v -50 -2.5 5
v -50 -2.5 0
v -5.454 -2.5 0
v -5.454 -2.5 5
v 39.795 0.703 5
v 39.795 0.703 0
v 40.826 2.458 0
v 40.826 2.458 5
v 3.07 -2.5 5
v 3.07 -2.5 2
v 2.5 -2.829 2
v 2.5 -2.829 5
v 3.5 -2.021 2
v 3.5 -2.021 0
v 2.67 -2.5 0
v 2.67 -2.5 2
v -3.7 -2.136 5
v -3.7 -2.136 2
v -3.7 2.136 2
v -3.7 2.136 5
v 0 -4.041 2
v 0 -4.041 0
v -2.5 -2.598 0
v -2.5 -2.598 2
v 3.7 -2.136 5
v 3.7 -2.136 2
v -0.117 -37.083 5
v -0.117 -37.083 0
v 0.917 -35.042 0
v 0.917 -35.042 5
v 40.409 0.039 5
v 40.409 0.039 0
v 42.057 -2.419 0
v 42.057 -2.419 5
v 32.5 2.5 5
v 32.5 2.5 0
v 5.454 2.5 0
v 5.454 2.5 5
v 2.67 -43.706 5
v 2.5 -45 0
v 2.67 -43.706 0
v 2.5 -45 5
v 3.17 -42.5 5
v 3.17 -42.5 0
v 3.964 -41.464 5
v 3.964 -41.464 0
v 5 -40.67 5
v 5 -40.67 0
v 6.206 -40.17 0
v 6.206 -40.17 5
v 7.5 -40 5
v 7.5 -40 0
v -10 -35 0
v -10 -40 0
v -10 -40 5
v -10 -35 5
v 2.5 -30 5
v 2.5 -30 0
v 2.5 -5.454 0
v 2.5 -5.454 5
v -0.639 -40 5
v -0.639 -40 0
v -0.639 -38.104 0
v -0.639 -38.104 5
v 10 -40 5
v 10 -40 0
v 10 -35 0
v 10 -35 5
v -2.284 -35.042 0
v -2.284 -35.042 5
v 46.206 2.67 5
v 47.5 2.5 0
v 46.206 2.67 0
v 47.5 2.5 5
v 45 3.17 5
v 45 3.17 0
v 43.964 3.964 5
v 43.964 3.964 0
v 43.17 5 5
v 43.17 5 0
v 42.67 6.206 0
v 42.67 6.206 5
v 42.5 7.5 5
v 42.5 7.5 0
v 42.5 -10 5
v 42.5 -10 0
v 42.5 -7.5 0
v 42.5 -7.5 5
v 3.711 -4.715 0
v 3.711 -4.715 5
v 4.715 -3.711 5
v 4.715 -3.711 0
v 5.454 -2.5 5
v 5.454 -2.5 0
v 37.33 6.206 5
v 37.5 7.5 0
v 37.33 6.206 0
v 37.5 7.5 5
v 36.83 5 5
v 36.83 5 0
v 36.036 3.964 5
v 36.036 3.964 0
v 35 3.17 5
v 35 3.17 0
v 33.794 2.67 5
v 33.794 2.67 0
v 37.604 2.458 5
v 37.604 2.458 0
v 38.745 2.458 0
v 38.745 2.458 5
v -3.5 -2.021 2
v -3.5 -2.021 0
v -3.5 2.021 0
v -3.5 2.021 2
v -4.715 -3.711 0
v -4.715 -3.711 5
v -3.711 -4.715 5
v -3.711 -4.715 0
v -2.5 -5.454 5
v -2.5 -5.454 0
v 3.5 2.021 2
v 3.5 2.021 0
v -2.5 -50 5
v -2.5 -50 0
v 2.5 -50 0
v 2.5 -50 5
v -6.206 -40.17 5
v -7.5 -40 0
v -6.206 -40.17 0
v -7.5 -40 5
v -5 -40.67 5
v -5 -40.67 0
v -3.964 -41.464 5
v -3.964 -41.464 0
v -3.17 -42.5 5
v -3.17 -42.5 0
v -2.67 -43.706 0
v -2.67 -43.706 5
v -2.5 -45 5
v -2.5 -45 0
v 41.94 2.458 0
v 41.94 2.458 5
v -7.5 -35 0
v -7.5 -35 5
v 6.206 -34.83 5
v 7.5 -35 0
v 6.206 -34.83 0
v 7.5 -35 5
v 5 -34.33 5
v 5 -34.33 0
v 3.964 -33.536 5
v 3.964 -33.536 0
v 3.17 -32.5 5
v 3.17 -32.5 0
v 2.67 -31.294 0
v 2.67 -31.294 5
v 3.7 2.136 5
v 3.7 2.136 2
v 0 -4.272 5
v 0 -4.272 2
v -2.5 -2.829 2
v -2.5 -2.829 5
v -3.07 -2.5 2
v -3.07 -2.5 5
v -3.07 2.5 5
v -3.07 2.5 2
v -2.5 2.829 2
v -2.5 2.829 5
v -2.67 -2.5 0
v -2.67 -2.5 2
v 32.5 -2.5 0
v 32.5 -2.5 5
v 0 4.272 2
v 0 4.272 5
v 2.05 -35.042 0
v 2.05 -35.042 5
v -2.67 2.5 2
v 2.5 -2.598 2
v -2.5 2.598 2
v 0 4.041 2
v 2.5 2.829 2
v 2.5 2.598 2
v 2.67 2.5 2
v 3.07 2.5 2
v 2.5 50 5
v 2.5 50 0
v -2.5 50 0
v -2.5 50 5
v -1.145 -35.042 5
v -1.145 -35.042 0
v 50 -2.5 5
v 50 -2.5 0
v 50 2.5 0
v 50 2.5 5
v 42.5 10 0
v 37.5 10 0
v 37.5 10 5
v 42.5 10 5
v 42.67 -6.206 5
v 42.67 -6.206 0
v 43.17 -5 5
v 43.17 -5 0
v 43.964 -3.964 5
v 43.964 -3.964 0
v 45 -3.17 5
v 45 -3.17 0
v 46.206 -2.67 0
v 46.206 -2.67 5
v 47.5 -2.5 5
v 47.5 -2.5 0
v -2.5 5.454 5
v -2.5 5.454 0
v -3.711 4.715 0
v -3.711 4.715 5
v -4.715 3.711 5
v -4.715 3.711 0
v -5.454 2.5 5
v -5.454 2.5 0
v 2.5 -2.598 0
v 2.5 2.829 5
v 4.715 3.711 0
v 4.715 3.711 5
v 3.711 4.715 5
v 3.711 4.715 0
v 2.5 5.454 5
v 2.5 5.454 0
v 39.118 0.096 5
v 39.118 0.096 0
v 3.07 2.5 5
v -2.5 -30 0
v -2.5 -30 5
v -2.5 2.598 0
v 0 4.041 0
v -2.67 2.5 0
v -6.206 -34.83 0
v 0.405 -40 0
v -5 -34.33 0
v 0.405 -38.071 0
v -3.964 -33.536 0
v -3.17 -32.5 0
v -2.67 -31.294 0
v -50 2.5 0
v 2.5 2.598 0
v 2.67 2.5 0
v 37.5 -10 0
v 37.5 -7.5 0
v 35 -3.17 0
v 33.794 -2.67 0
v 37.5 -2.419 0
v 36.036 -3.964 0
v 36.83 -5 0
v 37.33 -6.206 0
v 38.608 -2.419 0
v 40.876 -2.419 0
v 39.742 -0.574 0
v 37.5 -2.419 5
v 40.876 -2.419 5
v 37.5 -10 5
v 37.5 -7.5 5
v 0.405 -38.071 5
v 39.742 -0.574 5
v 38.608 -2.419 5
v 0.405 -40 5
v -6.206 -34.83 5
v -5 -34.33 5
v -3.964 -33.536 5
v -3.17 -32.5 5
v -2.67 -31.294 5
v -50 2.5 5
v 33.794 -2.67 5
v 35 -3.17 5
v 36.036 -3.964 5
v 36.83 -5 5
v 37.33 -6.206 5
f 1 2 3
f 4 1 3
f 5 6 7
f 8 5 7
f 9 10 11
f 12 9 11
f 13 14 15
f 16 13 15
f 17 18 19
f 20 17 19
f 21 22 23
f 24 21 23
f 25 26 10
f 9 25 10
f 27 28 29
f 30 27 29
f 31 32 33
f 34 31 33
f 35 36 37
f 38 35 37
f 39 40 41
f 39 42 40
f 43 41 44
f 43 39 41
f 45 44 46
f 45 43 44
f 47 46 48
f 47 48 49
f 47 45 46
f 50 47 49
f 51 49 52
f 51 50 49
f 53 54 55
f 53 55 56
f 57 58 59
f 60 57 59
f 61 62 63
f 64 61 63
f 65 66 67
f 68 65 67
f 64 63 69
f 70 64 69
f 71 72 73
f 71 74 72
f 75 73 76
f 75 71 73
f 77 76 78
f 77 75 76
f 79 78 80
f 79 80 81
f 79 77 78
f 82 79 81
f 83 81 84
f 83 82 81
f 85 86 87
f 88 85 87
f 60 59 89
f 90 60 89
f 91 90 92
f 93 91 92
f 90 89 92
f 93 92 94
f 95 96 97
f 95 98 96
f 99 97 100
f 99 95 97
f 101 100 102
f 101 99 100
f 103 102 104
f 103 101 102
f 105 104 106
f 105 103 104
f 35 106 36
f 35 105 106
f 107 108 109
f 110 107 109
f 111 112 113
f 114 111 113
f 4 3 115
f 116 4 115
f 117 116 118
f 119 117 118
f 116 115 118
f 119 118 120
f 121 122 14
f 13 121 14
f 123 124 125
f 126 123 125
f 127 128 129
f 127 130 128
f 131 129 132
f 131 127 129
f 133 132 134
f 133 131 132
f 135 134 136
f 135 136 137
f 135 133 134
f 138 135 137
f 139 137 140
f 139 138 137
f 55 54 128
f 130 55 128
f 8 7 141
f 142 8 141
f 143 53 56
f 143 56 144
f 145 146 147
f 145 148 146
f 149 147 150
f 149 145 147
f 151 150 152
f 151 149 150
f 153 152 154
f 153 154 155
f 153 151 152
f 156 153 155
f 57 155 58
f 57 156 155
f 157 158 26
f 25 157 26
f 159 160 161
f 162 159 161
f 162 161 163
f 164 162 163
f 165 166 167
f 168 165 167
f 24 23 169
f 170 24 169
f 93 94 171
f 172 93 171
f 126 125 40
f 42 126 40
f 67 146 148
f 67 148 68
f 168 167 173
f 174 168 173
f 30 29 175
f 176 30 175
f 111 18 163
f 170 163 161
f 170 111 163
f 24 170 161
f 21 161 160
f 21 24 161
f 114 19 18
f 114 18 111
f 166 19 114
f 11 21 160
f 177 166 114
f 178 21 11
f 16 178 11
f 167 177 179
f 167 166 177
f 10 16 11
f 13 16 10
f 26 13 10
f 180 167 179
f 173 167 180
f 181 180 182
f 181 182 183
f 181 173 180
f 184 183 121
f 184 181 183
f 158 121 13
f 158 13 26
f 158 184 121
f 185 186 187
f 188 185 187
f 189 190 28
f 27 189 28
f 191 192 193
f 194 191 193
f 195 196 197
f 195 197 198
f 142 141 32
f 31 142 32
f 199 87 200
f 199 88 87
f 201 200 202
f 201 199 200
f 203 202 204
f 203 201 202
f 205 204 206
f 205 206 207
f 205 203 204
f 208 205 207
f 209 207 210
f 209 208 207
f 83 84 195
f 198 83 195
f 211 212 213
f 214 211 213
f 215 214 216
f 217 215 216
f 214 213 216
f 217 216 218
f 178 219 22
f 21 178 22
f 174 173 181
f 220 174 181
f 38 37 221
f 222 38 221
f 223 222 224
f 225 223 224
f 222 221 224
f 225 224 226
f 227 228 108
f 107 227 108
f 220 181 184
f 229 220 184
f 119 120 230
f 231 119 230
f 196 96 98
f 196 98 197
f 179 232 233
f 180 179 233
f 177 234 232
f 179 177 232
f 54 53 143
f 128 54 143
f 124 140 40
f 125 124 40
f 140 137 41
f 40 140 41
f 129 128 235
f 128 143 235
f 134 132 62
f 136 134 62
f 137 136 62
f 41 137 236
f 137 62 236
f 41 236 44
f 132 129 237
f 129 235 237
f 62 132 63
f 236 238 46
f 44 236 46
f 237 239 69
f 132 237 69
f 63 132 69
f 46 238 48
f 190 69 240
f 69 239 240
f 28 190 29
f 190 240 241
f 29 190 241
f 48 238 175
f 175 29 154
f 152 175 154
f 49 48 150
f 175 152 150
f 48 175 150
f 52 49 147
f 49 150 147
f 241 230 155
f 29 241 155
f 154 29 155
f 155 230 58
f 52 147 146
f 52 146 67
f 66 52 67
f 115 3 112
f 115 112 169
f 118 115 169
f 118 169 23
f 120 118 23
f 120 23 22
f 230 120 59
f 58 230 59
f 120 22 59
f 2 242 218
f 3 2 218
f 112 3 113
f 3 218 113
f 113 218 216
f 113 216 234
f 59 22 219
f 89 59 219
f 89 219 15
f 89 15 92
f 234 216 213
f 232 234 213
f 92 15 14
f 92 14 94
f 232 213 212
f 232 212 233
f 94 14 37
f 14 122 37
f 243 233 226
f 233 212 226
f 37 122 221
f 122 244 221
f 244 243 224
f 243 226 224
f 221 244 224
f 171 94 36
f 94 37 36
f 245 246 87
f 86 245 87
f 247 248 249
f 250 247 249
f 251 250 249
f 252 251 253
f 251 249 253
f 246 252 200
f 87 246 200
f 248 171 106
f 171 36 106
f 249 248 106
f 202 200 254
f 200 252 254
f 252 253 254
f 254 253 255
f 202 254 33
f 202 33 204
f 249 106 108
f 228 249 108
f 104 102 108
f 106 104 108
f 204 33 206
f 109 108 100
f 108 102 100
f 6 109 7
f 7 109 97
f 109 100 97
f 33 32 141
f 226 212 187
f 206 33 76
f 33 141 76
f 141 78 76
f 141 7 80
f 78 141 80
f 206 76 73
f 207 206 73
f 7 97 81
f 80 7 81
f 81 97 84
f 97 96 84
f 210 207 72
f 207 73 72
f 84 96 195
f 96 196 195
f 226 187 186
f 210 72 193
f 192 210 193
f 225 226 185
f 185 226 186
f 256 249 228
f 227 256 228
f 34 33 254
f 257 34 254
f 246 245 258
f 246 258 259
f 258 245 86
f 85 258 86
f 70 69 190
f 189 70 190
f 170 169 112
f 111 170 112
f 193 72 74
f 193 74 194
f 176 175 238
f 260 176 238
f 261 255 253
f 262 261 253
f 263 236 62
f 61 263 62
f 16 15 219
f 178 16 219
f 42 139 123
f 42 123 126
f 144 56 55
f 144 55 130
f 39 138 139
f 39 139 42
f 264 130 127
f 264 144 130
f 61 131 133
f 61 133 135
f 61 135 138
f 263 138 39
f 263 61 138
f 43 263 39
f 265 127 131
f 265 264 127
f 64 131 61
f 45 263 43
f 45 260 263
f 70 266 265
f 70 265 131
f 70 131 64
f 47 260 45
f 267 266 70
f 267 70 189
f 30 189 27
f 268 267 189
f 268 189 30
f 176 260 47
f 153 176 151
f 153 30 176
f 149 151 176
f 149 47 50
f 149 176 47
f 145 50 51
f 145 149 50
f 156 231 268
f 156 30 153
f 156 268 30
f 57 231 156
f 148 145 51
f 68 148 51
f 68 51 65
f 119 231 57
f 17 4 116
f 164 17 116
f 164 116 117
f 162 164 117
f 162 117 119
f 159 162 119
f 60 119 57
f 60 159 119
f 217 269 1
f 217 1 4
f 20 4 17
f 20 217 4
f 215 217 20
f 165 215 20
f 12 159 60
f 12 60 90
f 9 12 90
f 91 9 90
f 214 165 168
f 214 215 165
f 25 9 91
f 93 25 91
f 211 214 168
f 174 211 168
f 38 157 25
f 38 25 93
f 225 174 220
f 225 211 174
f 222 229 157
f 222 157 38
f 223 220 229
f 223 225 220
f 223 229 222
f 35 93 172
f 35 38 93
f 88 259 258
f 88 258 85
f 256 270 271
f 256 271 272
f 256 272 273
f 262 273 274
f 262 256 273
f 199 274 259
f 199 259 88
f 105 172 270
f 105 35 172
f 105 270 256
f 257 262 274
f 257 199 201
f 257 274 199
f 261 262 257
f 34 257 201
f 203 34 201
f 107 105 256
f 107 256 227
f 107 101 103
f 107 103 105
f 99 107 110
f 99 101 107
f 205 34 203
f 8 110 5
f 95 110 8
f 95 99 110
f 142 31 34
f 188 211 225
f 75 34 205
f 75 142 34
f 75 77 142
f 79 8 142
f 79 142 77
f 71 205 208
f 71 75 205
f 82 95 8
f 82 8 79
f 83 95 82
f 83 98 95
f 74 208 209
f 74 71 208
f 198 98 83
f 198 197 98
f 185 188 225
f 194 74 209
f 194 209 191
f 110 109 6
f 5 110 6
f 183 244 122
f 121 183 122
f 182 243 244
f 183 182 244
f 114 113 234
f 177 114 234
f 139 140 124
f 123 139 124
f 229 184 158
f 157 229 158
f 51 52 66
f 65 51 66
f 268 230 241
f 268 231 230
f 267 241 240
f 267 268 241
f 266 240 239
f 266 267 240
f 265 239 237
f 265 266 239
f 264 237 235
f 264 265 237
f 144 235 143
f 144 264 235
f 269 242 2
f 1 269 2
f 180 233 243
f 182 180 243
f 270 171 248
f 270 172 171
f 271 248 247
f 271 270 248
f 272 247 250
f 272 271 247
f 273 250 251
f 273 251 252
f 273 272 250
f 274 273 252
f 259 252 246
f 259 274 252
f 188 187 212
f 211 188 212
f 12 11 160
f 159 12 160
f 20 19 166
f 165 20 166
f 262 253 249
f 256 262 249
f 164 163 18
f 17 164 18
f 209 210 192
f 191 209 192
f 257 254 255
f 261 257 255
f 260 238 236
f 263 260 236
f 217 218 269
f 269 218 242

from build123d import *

# Parameters (mm, degrees)
F0_W     = 5
F0_H     = 7.5
F0_W_2   = 7.5
F0_H_2   = 5
F1_DEPTH = 5
F2_DEPTH = 2
F3_R     = 5


with BuildPart() as f1:
    # F0 (on Top) → F1 (new body)
    with BuildSketch(Plane.XY):
        with BuildLine():
            Line((2.5, 5.4543560573), (2.5, 50))
            Line((2.5, 50), (-2.5, 50))
            Line((-2.5, 50), (-2.5, 5.4543560573))
            ThreePointArc((-2.5, 5.4543560573), (0, 6), (2.5, 5.4543560573))
        make_face()
        with BuildLine():
            ThreePointArc((5.4543560573, 2.5), (4.2426406871, 4.2426406871), (2.5, 5.4543560573))
            Line((2.5, 5.4543560573), (2.5, 2.829016319))
            Line((2.5, 2.829016319), (3.0698729811, 2.5))
            Line((3.0698729811, 2.5), (5.4543560573, 2.5))
        make_face()
        with BuildLine():
            Line((2.5, 2.829016319), (2.5, 5.4543560573))
            ThreePointArc((2.5, 5.4543560573), (0, 6), (-2.5, 5.4543560573))
            Line((-2.5, 5.4543560573), (-2.5, 2.829016319))
            Line((-2.5, 2.829016319), (0, 4.272391992))
            Line((0, 4.272391992), (2.5, 2.829016319))
        make_face()
        with BuildLine():
            Line((-2.5, 2.829016319), (-2.5, 5.4543560573))
            ThreePointArc((-2.5, 5.4543560573), (-4.2426406871, 4.2426406871), (-5.4543560573, 2.5))
            Line((-5.4543560573, 2.5), (-3.0698729811, 2.5))
            Line((-3.0698729811, 2.5), (-2.5, 2.829016319))
        make_face()
        with BuildLine():
            ThreePointArc((6, 0), (5.8620020617, 1.2794263668), (5.4543560573, 2.5))
            Line((5.4543560573, 2.5), (3.0698729811, 2.5))
            Line((3.0698729811, 2.5), (3.7, 2.136195996))
            Line((3.7, 2.136195996), (3.7, -2.136195996))
            Line((3.7, -2.136195996), (3.0698729811, -2.5))
            Line((3.0698729811, -2.5), (5.4543560573, -2.5))
            ThreePointArc((5.4543560573, -2.5), (5.8620020617, -1.2794263668), (6, 0))
        make_face()
        with BuildLine():
            Line((37.5, 2.5), (5.4543560573, 2.5))
            ThreePointArc((5.4543560573, 2.5), (5.8620020617, 1.2794263668), (6, 0))
            ThreePointArc((6, 0), (5.8620020617, -1.2794263668), (5.4543560573, -2.5))
            Line((5.4543560573, -2.5), (37.5, -2.5))
            Line((37.5, -2.5), (37.5, -2.4188727583))
            Line((37.5, -2.4188727583), (37.5, 2.5))
        make_face()
        with BuildLine():
            ThreePointArc((-5.4543560573, -2.5), (-6, 0), (-5.4543560573, 2.5))
            Line((-5.4543560573, 2.5), (-50, 2.5))
            Line((-50, 2.5), (-50, -2.5))
            Line((-50, -2.5), (-5.4543560573, -2.5))
        make_face()
        with BuildLine():
            Line((-3.0698729811, 2.5), (-5.4543560573, 2.5))
            ThreePointArc((-5.4543560573, 2.5), (-6, 0), (-5.4543560573, -2.5))
            Line((-5.4543560573, -2.5), (-3.0698729811, -2.5))
            Line((-3.0698729811, -2.5), (-3.7, -2.136195996))
            Line((-3.7, -2.136195996), (-3.7, 2.136195996))
            Line((-3.7, 2.136195996), (-3.0698729811, 2.5))
        make_face()
        with Locations((40, 6.25)):
            Rectangle(F0_W, F0_H)
        Polygon((42.5, 2.5), (37.5, 2.5), (37.5, -2.4188727583), (37.5, -2.5), (42.5, -2.5), align=None)
        Polygon((38.6080273271, -2.4188727583), (37.5, -2.4188727583), (39.1182749787, 0.0960717336), (37.6035439795, 2.4583689155), (38.7446626815, 2.4583689155), (39.7950469684, 0.7034585824), (40.8262169086, 2.4583689155), (41.9395815542, 2.4583689155), (40.4088385995, 0.0394961571), (42.0570025619, -2.4188727583), (40.8763877028, -2.4188727583), (39.7416737831, -0.574295474), align=None, mode=Mode.SUBTRACT)
        with BuildLine():
            Line((-3.0698729811, -2.5), (-5.4543560573, -2.5))
            ThreePointArc((-5.4543560573, -2.5), (-4.2426406871, -4.2426406871), (-2.5, -5.4543560573))
            Line((-2.5, -5.4543560573), (-2.5, -2.829016319))
            Line((-2.5, -2.829016319), (-3.0698729811, -2.5))
        make_face()
        with Locations((46.25, 0)):
            Rectangle(F0_W_2, F0_H_2)
        with BuildLine():
            ThreePointArc((2.5, -5.4543560573), (4.2426406871, -4.2426406871), (5.4543560573, -2.5))
            Line((5.4543560573, -2.5), (3.0698729811, -2.5))
            Line((3.0698729811, -2.5), (2.5, -2.829016319))
            Line((2.5, -2.829016319), (2.5, -5.4543560573))
        make_face()
        with BuildLine():
            ThreePointArc((2.5, -5.4543560573), (0, -6), (-2.5, -5.4543560573))
            Line((-2.5, -5.4543560573), (-2.5, -35))
            Line((-2.5, -35), (2.5, -35))
            Line((2.5, -35), (2.5, -5.4543560573))
        make_face()
        with BuildLine():
            Line((-2.5, -2.829016319), (-2.5, -5.4543560573))
            ThreePointArc((-2.5, -5.4543560573), (0, -6), (2.5, -5.4543560573))
            Line((2.5, -5.4543560573), (2.5, -2.829016319))
            Line((2.5, -2.829016319), (0, -4.272391992))
            Line((0, -4.272391992), (-2.5, -2.829016319))
        make_face()
        with Locations((40, -6.25)):
            Rectangle(F0_W, F0_H)
        Polygon((2.5, -35), (-2.5, -35), (-2.5, -40), (-0.6391059028, -40), (-0.6391059028, -38.1043836806), (-2.2840711806, -35.0423177083), (-1.1447482639, -35.0423177083), (-0.1171875, -37.0833333333), (0.9168836806, -35.0423177083), (2.0496961806, -35.0423177083), (0.4047309028, -38.0707465278), (0.4047309028, -40), (2.5, -40), align=None)
        with Locations((-6.25, -37.5)):
            Rectangle(F0_W_2, F0_H_2)
        with Locations((6.25, -37.5)):
            Rectangle(F0_W_2, F0_H_2)
        Polygon((-0.6391059028, -40), (-2.5, -40), (-2.5, -50), (2.5, -50), (2.5, -40), (0.4047309028, -40), align=None)
    extrude(amount=F1_DEPTH)

    # F0 (on Top) → F2 (join)
    with BuildSketch(Plane.XY):
        Polygon((2.5, 2.5980762114), (2.5, 2.829016319), (0, 4.272391992), (-2.5, 2.829016319), (-2.5, 2.5980762114), (0, 4.0414518843), align=None)
        Polygon((-2.6698729811, 2.5), (-3.0698729811, 2.5), (-3.7, 2.136195996), (-3.7, -2.136195996), (-3.0698729811, -2.5), (-2.6698729811, -2.5), (-3.5, -2.0207259422), (-3.5, 2.0207259422), align=None)
        Polygon((-2.5, 2.5980762114), (-2.5, 2.829016319), (-3.0698729811, 2.5), (-2.6698729811, 2.5), align=None)
        Polygon((-2.6698729811, -2.5), (-3.0698729811, -2.5), (-2.5, -2.829016319), (-2.5, -2.5980762114), align=None)
        Polygon((-2.5, -2.5980762114), (-2.5, -2.829016319), (0, -4.272391992), (2.5, -2.829016319), (2.5, -2.5980762114), (0, -4.0414518843), align=None)
        Polygon((2.5, -2.829016319), (3.0698729811, -2.5), (2.6698729811, -2.5), (2.5, -2.5980762114), align=None)
        Polygon((3.7, 2.136195996), (3.0698729811, 2.5), (2.6698729811, 2.5), (3.5, 2.0207259422), (3.5, -2.0207259422), (2.6698729811, -2.5), (3.0698729811, -2.5), (3.7, -2.136195996), align=None)
        Polygon((3.0698729811, 2.5), (2.5, 2.829016319), (2.5, 2.5980762114), (2.6698729811, 2.5), align=None)
    extrude(amount=F2_DEPTH)

    # F3
    f3_edges = [f1.edges().sort_by_distance(p)[0] for p in [
        (37.5, -2.5, 2.5),
        (-2.5, -40, 2.5),
        (-2.5, -35, 2.5),
        (37.5, 2.5, 2.5),
        (42.5, 2.5, 2.5),
        (2.5, -35, 2.5),
        (2.5, -40, 2.5),
        (42.5, -2.5, 2.5),
    ]]
    fillet(f3_edges, radius=F3_R)


solid = f1.part
